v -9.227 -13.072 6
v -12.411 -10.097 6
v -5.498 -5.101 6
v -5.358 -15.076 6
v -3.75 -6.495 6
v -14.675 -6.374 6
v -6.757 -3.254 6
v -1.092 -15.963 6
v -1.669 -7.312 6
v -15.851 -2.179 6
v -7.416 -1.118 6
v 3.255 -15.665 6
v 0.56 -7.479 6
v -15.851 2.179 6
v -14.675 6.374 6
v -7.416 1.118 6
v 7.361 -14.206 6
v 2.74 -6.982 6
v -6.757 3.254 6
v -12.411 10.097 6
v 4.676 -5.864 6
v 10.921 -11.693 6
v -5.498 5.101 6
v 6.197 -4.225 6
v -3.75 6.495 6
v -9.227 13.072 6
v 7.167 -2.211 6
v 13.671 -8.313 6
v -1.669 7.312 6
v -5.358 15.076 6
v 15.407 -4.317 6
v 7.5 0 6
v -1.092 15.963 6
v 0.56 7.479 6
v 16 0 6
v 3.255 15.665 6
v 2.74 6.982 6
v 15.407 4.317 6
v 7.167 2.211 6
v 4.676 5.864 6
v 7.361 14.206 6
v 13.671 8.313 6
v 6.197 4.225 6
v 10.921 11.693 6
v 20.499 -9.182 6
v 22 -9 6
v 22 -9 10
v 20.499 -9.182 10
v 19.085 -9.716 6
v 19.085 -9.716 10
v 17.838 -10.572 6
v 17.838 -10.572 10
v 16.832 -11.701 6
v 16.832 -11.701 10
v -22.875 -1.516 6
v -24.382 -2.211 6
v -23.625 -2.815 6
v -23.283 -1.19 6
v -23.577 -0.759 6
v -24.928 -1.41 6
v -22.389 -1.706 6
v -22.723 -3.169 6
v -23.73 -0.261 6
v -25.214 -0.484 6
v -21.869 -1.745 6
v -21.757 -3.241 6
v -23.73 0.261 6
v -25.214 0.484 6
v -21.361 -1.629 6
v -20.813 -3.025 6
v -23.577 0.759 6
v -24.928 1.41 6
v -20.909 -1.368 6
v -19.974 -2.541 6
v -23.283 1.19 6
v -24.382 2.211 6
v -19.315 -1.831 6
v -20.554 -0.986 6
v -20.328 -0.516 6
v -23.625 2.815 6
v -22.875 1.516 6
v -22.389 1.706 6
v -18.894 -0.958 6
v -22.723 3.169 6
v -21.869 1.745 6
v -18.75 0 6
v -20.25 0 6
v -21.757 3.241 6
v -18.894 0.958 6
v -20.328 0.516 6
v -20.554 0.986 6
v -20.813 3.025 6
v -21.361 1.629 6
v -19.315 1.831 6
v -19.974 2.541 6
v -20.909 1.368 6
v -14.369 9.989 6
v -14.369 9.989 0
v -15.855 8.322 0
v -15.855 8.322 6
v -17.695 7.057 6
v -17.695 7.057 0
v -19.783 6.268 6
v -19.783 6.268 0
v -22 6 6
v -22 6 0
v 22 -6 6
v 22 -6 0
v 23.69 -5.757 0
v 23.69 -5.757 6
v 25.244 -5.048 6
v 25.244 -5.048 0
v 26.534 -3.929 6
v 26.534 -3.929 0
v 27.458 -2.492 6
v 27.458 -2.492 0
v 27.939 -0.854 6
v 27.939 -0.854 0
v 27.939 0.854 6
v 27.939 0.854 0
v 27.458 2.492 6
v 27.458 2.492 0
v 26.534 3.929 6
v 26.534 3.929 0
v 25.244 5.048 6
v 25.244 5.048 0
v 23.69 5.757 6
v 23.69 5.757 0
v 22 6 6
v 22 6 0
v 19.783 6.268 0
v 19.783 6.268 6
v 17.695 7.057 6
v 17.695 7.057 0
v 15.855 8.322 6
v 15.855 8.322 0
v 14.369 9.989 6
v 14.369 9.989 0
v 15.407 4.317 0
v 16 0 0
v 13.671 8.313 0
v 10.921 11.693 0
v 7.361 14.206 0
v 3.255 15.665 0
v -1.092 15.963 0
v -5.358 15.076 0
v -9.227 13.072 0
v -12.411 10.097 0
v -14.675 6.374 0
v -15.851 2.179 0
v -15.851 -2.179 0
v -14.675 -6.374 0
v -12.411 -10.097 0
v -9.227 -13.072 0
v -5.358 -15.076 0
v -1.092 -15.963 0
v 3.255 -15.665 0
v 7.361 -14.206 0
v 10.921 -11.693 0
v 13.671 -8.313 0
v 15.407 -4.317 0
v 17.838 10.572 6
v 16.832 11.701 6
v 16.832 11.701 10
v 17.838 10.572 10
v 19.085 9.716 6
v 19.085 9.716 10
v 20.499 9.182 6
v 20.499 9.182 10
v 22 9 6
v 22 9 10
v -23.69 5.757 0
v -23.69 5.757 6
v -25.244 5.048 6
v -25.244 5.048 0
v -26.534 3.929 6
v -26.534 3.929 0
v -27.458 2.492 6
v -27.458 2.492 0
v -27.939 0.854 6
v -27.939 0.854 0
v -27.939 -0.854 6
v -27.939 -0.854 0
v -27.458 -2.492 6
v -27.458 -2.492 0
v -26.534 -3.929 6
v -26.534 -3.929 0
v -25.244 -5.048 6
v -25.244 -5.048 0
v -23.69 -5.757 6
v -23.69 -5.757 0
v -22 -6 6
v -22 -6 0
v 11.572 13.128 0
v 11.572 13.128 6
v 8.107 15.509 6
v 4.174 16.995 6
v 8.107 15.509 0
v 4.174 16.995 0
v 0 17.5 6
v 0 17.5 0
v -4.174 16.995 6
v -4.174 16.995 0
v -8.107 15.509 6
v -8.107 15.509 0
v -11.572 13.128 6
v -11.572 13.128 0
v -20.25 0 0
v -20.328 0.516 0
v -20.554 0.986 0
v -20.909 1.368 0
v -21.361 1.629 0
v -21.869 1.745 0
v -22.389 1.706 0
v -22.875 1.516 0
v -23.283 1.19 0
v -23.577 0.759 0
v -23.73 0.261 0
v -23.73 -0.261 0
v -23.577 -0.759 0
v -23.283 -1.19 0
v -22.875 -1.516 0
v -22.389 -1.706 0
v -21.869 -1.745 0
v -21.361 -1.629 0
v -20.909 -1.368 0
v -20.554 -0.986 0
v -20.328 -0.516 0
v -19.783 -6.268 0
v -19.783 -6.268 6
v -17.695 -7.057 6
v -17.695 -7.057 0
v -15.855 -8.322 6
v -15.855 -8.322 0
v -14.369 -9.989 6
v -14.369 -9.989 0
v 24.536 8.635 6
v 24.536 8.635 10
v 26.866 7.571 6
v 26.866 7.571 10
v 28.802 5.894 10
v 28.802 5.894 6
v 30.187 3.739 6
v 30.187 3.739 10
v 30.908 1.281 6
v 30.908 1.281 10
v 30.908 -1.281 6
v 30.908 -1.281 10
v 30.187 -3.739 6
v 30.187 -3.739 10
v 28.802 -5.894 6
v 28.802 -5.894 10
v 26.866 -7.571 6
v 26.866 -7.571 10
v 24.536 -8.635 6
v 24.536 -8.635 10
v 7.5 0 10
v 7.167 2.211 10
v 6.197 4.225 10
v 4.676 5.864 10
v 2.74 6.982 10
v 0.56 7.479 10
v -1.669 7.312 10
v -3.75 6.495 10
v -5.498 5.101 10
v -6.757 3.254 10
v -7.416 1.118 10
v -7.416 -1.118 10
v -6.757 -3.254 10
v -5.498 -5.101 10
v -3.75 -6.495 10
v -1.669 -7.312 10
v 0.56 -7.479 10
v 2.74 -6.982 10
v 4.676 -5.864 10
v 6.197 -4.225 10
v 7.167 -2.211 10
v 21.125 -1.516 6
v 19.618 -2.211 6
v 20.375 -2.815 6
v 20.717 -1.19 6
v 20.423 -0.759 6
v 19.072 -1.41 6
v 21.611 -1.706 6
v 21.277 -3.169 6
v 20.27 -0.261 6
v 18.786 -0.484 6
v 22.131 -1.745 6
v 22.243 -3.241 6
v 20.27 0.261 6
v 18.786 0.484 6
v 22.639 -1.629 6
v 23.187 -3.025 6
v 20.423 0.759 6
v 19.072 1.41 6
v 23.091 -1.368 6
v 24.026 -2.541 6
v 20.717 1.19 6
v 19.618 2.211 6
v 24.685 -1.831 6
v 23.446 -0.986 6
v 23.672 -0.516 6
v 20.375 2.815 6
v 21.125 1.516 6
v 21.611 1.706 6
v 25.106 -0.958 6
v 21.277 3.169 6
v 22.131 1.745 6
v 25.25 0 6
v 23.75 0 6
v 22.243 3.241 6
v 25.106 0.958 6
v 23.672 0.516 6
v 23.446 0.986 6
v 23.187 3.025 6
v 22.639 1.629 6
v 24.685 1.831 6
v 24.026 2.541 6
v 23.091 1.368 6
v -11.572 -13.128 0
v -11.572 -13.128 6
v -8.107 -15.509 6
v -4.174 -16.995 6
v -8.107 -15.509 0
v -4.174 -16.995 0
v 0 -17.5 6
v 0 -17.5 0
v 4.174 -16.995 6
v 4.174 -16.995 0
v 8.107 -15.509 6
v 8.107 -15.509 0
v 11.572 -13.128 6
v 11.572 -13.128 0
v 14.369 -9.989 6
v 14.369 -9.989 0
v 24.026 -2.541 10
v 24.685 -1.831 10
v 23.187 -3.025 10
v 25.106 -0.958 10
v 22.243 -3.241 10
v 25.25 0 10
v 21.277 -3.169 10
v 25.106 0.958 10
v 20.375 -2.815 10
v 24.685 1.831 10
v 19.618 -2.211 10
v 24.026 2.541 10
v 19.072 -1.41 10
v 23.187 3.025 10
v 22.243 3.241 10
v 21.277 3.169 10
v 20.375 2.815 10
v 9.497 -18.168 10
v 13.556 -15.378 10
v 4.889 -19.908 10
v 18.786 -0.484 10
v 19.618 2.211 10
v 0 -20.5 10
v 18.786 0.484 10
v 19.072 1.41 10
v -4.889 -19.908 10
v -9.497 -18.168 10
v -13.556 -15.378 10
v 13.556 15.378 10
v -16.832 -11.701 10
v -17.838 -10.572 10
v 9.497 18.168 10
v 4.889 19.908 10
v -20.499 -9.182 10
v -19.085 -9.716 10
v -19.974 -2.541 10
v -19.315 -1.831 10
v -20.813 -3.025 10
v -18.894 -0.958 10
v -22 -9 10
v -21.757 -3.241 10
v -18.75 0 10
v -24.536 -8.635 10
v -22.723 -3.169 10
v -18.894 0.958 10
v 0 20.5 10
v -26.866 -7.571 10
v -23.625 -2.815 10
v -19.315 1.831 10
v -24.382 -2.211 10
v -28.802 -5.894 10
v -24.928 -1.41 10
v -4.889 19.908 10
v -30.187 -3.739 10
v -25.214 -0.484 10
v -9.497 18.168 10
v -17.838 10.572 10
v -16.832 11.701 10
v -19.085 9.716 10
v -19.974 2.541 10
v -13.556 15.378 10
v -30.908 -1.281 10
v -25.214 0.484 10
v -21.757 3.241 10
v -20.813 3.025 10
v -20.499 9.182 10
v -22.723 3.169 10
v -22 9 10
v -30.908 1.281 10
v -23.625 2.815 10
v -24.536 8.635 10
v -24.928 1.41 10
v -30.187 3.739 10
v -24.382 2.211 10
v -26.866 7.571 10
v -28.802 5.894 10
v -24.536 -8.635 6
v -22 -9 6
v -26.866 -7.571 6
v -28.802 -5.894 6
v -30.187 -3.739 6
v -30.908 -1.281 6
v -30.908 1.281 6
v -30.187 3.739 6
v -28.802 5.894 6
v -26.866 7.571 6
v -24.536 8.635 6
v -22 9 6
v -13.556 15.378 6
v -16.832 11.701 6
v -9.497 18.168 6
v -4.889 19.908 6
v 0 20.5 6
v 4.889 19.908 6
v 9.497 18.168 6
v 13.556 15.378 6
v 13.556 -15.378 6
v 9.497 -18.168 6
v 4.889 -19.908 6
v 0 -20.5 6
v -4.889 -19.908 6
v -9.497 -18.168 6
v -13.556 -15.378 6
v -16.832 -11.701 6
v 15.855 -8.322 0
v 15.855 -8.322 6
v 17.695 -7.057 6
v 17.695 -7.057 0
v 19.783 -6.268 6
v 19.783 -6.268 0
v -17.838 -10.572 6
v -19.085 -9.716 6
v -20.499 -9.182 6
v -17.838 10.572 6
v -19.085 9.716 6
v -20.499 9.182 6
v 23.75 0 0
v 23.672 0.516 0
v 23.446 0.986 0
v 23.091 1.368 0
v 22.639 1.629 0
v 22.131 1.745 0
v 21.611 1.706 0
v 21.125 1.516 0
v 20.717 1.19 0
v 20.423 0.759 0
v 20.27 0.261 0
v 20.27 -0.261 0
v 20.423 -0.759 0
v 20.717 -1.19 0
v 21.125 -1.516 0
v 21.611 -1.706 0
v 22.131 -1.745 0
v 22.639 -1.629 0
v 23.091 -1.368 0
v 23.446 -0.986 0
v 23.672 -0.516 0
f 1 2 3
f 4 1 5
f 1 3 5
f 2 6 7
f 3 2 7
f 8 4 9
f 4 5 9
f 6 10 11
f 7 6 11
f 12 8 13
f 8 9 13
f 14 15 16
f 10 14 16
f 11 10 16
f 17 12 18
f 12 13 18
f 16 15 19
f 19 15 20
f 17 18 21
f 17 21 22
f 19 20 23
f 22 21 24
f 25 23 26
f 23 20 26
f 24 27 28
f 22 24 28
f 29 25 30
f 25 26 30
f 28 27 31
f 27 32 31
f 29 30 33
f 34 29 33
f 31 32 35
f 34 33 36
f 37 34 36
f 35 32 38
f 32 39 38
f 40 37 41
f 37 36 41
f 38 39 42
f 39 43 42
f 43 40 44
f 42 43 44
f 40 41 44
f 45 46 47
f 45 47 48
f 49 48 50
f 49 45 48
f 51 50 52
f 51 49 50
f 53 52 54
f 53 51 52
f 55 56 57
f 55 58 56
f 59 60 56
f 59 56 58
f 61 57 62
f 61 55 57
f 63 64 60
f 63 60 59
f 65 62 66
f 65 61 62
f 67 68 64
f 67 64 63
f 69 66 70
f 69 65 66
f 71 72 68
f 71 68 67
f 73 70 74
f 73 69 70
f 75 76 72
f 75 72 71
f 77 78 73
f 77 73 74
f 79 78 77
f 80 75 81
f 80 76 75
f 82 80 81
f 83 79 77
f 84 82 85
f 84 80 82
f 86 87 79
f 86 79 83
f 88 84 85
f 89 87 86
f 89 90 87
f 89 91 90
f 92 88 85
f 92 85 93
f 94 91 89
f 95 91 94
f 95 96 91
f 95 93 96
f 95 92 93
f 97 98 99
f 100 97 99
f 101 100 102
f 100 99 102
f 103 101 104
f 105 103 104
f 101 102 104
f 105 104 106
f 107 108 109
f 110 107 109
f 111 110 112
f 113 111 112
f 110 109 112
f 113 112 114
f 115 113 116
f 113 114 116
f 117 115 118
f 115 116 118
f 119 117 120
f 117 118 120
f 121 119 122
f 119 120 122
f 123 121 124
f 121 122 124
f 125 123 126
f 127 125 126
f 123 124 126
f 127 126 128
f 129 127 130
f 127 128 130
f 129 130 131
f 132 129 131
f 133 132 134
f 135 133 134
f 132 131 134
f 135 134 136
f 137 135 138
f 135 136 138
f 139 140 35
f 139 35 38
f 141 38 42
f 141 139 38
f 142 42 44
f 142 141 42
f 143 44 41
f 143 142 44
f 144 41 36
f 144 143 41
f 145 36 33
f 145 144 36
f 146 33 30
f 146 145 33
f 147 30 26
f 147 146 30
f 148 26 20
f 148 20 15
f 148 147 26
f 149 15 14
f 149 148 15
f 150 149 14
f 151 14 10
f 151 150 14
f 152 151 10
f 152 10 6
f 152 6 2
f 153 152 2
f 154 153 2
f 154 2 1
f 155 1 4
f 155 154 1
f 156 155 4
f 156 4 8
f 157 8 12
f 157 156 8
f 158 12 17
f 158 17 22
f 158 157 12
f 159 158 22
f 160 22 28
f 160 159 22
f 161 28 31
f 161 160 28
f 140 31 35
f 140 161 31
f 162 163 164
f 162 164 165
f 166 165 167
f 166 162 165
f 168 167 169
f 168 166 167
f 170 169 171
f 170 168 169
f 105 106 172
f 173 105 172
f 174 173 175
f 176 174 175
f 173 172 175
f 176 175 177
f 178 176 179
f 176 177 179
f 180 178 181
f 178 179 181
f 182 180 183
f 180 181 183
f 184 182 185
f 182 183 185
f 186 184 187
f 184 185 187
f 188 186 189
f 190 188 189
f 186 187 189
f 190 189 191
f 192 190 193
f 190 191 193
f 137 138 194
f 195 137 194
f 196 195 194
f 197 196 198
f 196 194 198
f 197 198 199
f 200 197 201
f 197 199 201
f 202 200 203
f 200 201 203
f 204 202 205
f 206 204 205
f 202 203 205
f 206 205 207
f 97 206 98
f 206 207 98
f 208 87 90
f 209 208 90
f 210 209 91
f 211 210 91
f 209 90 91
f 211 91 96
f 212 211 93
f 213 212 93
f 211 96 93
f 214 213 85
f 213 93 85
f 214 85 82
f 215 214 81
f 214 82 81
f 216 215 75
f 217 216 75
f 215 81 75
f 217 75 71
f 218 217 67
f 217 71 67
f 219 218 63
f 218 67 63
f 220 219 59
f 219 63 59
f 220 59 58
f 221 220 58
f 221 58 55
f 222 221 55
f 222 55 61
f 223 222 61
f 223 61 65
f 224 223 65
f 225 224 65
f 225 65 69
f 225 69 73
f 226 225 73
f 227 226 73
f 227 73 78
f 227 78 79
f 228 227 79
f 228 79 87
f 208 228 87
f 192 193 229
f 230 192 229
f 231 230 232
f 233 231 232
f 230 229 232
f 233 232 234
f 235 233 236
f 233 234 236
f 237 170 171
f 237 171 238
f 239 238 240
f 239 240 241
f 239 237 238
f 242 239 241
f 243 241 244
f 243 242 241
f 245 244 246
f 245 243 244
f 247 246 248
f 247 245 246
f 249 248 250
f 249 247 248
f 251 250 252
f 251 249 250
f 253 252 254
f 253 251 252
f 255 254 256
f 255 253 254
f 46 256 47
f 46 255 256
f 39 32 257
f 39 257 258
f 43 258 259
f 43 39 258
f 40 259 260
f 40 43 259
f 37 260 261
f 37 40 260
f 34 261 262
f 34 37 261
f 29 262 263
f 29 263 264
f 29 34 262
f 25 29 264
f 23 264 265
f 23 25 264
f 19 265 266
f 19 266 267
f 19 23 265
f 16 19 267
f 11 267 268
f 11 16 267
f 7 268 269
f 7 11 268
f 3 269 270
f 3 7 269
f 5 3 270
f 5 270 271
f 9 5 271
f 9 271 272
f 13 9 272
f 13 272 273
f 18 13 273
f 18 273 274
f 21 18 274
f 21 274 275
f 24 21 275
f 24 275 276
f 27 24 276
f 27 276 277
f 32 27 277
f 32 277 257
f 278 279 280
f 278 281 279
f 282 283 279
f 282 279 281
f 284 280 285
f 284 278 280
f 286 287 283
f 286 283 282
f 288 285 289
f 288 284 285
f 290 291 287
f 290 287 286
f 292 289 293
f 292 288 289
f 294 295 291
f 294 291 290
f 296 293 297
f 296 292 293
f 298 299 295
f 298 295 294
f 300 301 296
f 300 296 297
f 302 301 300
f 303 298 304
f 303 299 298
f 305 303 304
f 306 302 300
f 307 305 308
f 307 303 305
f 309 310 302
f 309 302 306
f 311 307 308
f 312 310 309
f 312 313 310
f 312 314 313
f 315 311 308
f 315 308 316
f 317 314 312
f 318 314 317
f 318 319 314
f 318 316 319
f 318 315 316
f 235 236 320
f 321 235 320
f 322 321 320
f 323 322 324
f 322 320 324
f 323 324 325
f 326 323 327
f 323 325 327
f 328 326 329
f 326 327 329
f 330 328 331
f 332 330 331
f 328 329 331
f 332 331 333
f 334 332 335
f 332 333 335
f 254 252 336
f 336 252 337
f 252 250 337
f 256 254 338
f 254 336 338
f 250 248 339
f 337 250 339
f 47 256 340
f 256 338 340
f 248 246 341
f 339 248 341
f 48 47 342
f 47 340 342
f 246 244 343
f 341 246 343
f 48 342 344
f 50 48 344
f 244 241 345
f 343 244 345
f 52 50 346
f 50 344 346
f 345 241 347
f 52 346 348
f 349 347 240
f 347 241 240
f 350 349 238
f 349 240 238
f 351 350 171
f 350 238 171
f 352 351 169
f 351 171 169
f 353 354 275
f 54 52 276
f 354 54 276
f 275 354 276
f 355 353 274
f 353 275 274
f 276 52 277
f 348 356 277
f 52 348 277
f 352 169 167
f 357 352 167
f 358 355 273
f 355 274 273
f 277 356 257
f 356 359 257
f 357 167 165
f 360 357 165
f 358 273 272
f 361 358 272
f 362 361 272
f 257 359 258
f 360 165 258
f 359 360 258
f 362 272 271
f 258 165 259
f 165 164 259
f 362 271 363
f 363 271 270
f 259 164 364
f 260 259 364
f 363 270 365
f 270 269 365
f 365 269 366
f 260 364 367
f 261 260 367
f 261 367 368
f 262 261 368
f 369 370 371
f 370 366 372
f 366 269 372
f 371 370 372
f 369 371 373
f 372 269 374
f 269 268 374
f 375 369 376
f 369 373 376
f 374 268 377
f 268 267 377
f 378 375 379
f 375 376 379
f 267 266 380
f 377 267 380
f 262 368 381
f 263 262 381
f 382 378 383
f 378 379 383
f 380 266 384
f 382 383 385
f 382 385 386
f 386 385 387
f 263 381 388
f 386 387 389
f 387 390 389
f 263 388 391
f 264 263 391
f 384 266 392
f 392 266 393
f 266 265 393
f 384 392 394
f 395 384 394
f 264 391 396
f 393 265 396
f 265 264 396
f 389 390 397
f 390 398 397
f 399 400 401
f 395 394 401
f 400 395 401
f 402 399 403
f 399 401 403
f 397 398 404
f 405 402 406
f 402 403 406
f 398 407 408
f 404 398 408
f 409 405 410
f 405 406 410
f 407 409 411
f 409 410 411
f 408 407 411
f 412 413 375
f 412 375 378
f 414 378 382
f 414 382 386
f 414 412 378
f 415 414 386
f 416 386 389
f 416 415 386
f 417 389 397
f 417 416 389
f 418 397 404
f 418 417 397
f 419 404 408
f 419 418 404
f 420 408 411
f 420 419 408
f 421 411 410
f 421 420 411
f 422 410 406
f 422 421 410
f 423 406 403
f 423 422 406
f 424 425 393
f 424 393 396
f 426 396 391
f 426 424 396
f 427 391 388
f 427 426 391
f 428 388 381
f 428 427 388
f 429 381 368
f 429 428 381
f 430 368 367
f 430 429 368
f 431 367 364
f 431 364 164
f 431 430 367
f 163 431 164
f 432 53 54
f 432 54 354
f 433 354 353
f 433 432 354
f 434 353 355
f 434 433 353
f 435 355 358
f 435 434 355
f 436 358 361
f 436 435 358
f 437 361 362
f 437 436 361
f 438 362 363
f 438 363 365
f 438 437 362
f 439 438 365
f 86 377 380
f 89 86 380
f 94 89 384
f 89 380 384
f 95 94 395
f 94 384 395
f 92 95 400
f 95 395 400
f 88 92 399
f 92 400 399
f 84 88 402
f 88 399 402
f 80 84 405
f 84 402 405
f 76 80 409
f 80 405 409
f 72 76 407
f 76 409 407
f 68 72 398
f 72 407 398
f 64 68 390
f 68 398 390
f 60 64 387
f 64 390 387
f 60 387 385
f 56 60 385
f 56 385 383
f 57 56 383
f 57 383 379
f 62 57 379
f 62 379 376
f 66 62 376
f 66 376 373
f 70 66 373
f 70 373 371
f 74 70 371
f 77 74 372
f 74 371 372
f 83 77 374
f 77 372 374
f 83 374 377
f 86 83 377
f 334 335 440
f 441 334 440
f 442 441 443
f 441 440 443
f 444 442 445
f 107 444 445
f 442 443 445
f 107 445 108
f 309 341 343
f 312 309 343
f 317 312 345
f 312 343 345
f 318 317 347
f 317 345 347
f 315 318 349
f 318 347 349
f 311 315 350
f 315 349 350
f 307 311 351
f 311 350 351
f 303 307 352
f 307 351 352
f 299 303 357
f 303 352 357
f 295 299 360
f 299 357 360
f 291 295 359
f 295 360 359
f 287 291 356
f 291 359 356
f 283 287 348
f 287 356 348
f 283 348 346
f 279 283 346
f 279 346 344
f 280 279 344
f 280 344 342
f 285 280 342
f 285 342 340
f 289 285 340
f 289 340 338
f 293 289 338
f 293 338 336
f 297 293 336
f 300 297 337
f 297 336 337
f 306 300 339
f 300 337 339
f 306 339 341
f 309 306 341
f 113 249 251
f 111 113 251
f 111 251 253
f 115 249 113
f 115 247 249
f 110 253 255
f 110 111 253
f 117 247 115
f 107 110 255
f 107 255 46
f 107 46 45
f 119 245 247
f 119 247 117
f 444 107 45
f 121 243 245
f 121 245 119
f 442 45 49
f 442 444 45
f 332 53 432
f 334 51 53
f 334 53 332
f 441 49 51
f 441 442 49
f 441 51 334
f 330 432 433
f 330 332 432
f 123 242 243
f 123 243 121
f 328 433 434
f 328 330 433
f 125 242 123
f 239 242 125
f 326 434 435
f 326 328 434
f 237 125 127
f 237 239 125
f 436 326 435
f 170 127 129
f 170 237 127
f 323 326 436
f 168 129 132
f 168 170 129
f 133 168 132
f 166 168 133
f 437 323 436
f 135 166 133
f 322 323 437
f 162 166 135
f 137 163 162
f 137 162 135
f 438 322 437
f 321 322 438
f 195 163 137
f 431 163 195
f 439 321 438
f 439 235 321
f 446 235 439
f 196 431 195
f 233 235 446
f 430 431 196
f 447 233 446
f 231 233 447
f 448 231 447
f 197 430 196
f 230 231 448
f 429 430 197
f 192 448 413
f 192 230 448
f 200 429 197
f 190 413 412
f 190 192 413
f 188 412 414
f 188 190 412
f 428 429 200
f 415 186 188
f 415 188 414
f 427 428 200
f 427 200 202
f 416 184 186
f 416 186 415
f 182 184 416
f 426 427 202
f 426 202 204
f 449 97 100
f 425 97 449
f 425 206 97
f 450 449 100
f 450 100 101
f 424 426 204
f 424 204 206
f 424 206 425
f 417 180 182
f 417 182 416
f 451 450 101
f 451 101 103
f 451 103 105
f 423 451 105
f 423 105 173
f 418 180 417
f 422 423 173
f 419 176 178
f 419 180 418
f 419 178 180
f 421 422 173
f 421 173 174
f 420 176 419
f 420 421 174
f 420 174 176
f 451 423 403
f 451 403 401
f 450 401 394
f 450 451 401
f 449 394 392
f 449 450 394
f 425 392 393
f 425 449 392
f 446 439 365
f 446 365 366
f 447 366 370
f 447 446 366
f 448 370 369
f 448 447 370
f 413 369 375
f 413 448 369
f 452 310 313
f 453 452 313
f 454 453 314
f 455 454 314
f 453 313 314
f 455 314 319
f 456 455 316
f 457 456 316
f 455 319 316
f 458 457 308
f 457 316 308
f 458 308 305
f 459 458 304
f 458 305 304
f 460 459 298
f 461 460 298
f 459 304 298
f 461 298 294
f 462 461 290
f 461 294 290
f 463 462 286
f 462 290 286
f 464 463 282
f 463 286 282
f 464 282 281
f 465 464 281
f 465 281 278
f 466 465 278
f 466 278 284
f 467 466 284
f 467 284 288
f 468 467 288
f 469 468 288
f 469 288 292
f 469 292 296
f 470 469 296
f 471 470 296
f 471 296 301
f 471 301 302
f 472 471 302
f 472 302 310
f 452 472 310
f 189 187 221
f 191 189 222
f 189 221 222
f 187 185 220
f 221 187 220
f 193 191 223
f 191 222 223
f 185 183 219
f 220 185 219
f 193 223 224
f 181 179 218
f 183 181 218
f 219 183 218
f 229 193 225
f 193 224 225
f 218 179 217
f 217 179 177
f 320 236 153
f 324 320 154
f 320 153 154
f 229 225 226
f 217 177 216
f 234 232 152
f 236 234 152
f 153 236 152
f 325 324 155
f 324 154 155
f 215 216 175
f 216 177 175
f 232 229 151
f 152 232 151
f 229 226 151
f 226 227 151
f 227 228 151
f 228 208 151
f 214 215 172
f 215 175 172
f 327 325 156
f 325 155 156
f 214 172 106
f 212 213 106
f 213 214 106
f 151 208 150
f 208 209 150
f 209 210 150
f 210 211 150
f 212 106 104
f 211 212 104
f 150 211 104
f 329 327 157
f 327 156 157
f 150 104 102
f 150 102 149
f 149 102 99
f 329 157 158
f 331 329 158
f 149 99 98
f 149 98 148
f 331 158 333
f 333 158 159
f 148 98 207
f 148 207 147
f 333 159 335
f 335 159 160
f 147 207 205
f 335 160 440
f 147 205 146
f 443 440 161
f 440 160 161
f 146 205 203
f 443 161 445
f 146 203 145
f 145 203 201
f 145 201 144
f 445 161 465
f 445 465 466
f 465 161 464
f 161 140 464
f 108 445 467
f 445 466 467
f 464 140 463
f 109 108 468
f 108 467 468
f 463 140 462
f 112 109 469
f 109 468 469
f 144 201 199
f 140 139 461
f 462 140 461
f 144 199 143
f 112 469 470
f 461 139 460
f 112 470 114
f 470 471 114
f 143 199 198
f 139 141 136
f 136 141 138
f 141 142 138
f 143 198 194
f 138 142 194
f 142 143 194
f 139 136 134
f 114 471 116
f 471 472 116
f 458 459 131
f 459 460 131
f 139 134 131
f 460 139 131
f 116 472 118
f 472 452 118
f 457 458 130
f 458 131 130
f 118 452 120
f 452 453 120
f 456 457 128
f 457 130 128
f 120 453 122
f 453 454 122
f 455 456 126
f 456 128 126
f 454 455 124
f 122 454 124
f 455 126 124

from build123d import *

# Parameters (mm, degrees)
BOSS_EXTRUDE1_DEPTH = 10
SKETCH1_3_R         = 16
SKETCH1_3_R_2       = 7.5
CUT_EXTRUDE1_DEPTH  = 6
SKETCH1_4_R         = 7.5
CUT_EXTRUDE2_DEPTH  = 10
CUT_EXTRUDE3_DEPTH  = 6
SKETCH3_R           = 1.75
CUT_EXTRUDE4_DEPTH  = 10
SKETCH4_R           = 3.25
CUT_EXTRUDE5_DEPTH  = 4


with BuildPart() as part:
    # Sketch1 → Boss-Extrude1 (new body)
    with BuildSketch(Plane.XY):
        with BuildLine():
            ThreePointArc((-16.832454361, 11.701217039), (-19.084519704, 9.716037695), (-22, 9))
            ThreePointArc((-22, 9), (-31, 0), (-22, -9))
            ThreePointArc((-22, -9), (-19.084519704, -9.716037695), (-16.832454361, -11.701217039))
            ThreePointArc((-16.832454361, -11.701217039), (0, -20.5), (16.832454361, -11.701217039))
            ThreePointArc((16.832454361, -11.701217039), (19.084519704, -9.716037695), (22, -9))
            ThreePointArc((22, -9), (31, 0), (22, 9))
            ThreePointArc((22, 9), (19.084519704, 9.716037695), (16.832454361, 11.701217039))
            ThreePointArc((16.832454361, 11.701217039), (0, 20.5), (-16.832454361, 11.701217039))
        make_face()
    extrude(amount=BOSS_EXTRUDE1_DEPTH)

    # Sketch1<3> → Cut-Extrude1 (cut)
    with BuildSketch(Plane.XY):
        Circle(SKETCH1_3_R)
        Circle(SKETCH1_3_R_2, mode=Mode.SUBTRACT)
    extrude(amount=CUT_EXTRUDE1_DEPTH, mode=Mode.SUBTRACT)

    # Sketch1<4> → Cut-Extrude2 (cut)
    with BuildSketch(Plane.XY):
        Circle(SKETCH1_4_R)
    extrude(amount=CUT_EXTRUDE2_DEPTH, mode=Mode.SUBTRACT)

    # Sketch1<5> → Cut-Extrude3 (cut)
    with BuildSketch(Plane.XY):
        with BuildLine():
            ThreePointArc((-16.832454361, 11.701217039), (-19.084519704, 9.716037695), (-22, 9))
            ThreePointArc((-22, 9), (-31, 0), (-22, -9))
            ThreePointArc((-22, -9), (-19.084519704, -9.716037695), (-16.832454361, -11.701217039))
            ThreePointArc((-16.832454361, -11.701217039), (0, -20.5), (16.832454361, -11.701217039))
            ThreePointArc((16.832454361, -11.701217039), (19.084519704, -9.716037695), (22, -9))
            ThreePointArc((22, -9), (31, 0), (22, 9))
            ThreePointArc((22, 9), (19.084519704, 9.716037695), (16.832454361, 11.701217039))
            ThreePointArc((16.832454361, 11.701217039), (0, 20.5), (-16.832454361, 11.701217039))
        make_face()
        with BuildLine():
            ThreePointArc((-22, -6), (-28, 0), (-22, 6))
            ThreePointArc((-22, 6), (-17.694757076, 7.057361363), (-14.369168357, 9.988843813))
            ThreePointArc((-14.369168357, 9.988843813), (0, 17.5), (14.369168357, 9.988843813))
            ThreePointArc((14.369168357, 9.988843813), (17.694757076, 7.057361363), (22, 6))
            ThreePointArc((22, 6), (28, 0), (22, -6))
            ThreePointArc((22, -6), (17.694757076, -7.057361363), (14.369168357, -9.988843813))
            ThreePointArc((14.369168357, -9.988843813), (0, -17.5), (-14.369168357, -9.988843813))
            ThreePointArc((-14.369168357, -9.988843813), (-17.694757076, -7.057361363), (-22, -6))
        make_face(mode=Mode.SUBTRACT)
    extrude(amount=CUT_EXTRUDE3_DEPTH, mode=Mode.SUBTRACT)

    # Sketch3 → Cut-Extrude4 (cut)
    with BuildSketch(Plane.XY.offset(10)):
        with Locations((22, 0)):
            Circle(SKETCH3_R)
        with Locations((-22, 0)):
            Circle(SKETCH3_R)
    extrude(amount=-CUT_EXTRUDE4_DEPTH, mode=Mode.SUBTRACT)

    # Sketch4 → Cut-Extrude5 (cut)
    with BuildSketch(Plane.XY.offset(10)):
        with Locations((22, 0)):
            Circle(SKETCH4_R)
        with Locations((-22, 0)):
            Circle(SKETCH4_R)
    extrude(amount=-CUT_EXTRUDE5_DEPTH, mode=Mode.SUBTRACT)


solid = part.part
